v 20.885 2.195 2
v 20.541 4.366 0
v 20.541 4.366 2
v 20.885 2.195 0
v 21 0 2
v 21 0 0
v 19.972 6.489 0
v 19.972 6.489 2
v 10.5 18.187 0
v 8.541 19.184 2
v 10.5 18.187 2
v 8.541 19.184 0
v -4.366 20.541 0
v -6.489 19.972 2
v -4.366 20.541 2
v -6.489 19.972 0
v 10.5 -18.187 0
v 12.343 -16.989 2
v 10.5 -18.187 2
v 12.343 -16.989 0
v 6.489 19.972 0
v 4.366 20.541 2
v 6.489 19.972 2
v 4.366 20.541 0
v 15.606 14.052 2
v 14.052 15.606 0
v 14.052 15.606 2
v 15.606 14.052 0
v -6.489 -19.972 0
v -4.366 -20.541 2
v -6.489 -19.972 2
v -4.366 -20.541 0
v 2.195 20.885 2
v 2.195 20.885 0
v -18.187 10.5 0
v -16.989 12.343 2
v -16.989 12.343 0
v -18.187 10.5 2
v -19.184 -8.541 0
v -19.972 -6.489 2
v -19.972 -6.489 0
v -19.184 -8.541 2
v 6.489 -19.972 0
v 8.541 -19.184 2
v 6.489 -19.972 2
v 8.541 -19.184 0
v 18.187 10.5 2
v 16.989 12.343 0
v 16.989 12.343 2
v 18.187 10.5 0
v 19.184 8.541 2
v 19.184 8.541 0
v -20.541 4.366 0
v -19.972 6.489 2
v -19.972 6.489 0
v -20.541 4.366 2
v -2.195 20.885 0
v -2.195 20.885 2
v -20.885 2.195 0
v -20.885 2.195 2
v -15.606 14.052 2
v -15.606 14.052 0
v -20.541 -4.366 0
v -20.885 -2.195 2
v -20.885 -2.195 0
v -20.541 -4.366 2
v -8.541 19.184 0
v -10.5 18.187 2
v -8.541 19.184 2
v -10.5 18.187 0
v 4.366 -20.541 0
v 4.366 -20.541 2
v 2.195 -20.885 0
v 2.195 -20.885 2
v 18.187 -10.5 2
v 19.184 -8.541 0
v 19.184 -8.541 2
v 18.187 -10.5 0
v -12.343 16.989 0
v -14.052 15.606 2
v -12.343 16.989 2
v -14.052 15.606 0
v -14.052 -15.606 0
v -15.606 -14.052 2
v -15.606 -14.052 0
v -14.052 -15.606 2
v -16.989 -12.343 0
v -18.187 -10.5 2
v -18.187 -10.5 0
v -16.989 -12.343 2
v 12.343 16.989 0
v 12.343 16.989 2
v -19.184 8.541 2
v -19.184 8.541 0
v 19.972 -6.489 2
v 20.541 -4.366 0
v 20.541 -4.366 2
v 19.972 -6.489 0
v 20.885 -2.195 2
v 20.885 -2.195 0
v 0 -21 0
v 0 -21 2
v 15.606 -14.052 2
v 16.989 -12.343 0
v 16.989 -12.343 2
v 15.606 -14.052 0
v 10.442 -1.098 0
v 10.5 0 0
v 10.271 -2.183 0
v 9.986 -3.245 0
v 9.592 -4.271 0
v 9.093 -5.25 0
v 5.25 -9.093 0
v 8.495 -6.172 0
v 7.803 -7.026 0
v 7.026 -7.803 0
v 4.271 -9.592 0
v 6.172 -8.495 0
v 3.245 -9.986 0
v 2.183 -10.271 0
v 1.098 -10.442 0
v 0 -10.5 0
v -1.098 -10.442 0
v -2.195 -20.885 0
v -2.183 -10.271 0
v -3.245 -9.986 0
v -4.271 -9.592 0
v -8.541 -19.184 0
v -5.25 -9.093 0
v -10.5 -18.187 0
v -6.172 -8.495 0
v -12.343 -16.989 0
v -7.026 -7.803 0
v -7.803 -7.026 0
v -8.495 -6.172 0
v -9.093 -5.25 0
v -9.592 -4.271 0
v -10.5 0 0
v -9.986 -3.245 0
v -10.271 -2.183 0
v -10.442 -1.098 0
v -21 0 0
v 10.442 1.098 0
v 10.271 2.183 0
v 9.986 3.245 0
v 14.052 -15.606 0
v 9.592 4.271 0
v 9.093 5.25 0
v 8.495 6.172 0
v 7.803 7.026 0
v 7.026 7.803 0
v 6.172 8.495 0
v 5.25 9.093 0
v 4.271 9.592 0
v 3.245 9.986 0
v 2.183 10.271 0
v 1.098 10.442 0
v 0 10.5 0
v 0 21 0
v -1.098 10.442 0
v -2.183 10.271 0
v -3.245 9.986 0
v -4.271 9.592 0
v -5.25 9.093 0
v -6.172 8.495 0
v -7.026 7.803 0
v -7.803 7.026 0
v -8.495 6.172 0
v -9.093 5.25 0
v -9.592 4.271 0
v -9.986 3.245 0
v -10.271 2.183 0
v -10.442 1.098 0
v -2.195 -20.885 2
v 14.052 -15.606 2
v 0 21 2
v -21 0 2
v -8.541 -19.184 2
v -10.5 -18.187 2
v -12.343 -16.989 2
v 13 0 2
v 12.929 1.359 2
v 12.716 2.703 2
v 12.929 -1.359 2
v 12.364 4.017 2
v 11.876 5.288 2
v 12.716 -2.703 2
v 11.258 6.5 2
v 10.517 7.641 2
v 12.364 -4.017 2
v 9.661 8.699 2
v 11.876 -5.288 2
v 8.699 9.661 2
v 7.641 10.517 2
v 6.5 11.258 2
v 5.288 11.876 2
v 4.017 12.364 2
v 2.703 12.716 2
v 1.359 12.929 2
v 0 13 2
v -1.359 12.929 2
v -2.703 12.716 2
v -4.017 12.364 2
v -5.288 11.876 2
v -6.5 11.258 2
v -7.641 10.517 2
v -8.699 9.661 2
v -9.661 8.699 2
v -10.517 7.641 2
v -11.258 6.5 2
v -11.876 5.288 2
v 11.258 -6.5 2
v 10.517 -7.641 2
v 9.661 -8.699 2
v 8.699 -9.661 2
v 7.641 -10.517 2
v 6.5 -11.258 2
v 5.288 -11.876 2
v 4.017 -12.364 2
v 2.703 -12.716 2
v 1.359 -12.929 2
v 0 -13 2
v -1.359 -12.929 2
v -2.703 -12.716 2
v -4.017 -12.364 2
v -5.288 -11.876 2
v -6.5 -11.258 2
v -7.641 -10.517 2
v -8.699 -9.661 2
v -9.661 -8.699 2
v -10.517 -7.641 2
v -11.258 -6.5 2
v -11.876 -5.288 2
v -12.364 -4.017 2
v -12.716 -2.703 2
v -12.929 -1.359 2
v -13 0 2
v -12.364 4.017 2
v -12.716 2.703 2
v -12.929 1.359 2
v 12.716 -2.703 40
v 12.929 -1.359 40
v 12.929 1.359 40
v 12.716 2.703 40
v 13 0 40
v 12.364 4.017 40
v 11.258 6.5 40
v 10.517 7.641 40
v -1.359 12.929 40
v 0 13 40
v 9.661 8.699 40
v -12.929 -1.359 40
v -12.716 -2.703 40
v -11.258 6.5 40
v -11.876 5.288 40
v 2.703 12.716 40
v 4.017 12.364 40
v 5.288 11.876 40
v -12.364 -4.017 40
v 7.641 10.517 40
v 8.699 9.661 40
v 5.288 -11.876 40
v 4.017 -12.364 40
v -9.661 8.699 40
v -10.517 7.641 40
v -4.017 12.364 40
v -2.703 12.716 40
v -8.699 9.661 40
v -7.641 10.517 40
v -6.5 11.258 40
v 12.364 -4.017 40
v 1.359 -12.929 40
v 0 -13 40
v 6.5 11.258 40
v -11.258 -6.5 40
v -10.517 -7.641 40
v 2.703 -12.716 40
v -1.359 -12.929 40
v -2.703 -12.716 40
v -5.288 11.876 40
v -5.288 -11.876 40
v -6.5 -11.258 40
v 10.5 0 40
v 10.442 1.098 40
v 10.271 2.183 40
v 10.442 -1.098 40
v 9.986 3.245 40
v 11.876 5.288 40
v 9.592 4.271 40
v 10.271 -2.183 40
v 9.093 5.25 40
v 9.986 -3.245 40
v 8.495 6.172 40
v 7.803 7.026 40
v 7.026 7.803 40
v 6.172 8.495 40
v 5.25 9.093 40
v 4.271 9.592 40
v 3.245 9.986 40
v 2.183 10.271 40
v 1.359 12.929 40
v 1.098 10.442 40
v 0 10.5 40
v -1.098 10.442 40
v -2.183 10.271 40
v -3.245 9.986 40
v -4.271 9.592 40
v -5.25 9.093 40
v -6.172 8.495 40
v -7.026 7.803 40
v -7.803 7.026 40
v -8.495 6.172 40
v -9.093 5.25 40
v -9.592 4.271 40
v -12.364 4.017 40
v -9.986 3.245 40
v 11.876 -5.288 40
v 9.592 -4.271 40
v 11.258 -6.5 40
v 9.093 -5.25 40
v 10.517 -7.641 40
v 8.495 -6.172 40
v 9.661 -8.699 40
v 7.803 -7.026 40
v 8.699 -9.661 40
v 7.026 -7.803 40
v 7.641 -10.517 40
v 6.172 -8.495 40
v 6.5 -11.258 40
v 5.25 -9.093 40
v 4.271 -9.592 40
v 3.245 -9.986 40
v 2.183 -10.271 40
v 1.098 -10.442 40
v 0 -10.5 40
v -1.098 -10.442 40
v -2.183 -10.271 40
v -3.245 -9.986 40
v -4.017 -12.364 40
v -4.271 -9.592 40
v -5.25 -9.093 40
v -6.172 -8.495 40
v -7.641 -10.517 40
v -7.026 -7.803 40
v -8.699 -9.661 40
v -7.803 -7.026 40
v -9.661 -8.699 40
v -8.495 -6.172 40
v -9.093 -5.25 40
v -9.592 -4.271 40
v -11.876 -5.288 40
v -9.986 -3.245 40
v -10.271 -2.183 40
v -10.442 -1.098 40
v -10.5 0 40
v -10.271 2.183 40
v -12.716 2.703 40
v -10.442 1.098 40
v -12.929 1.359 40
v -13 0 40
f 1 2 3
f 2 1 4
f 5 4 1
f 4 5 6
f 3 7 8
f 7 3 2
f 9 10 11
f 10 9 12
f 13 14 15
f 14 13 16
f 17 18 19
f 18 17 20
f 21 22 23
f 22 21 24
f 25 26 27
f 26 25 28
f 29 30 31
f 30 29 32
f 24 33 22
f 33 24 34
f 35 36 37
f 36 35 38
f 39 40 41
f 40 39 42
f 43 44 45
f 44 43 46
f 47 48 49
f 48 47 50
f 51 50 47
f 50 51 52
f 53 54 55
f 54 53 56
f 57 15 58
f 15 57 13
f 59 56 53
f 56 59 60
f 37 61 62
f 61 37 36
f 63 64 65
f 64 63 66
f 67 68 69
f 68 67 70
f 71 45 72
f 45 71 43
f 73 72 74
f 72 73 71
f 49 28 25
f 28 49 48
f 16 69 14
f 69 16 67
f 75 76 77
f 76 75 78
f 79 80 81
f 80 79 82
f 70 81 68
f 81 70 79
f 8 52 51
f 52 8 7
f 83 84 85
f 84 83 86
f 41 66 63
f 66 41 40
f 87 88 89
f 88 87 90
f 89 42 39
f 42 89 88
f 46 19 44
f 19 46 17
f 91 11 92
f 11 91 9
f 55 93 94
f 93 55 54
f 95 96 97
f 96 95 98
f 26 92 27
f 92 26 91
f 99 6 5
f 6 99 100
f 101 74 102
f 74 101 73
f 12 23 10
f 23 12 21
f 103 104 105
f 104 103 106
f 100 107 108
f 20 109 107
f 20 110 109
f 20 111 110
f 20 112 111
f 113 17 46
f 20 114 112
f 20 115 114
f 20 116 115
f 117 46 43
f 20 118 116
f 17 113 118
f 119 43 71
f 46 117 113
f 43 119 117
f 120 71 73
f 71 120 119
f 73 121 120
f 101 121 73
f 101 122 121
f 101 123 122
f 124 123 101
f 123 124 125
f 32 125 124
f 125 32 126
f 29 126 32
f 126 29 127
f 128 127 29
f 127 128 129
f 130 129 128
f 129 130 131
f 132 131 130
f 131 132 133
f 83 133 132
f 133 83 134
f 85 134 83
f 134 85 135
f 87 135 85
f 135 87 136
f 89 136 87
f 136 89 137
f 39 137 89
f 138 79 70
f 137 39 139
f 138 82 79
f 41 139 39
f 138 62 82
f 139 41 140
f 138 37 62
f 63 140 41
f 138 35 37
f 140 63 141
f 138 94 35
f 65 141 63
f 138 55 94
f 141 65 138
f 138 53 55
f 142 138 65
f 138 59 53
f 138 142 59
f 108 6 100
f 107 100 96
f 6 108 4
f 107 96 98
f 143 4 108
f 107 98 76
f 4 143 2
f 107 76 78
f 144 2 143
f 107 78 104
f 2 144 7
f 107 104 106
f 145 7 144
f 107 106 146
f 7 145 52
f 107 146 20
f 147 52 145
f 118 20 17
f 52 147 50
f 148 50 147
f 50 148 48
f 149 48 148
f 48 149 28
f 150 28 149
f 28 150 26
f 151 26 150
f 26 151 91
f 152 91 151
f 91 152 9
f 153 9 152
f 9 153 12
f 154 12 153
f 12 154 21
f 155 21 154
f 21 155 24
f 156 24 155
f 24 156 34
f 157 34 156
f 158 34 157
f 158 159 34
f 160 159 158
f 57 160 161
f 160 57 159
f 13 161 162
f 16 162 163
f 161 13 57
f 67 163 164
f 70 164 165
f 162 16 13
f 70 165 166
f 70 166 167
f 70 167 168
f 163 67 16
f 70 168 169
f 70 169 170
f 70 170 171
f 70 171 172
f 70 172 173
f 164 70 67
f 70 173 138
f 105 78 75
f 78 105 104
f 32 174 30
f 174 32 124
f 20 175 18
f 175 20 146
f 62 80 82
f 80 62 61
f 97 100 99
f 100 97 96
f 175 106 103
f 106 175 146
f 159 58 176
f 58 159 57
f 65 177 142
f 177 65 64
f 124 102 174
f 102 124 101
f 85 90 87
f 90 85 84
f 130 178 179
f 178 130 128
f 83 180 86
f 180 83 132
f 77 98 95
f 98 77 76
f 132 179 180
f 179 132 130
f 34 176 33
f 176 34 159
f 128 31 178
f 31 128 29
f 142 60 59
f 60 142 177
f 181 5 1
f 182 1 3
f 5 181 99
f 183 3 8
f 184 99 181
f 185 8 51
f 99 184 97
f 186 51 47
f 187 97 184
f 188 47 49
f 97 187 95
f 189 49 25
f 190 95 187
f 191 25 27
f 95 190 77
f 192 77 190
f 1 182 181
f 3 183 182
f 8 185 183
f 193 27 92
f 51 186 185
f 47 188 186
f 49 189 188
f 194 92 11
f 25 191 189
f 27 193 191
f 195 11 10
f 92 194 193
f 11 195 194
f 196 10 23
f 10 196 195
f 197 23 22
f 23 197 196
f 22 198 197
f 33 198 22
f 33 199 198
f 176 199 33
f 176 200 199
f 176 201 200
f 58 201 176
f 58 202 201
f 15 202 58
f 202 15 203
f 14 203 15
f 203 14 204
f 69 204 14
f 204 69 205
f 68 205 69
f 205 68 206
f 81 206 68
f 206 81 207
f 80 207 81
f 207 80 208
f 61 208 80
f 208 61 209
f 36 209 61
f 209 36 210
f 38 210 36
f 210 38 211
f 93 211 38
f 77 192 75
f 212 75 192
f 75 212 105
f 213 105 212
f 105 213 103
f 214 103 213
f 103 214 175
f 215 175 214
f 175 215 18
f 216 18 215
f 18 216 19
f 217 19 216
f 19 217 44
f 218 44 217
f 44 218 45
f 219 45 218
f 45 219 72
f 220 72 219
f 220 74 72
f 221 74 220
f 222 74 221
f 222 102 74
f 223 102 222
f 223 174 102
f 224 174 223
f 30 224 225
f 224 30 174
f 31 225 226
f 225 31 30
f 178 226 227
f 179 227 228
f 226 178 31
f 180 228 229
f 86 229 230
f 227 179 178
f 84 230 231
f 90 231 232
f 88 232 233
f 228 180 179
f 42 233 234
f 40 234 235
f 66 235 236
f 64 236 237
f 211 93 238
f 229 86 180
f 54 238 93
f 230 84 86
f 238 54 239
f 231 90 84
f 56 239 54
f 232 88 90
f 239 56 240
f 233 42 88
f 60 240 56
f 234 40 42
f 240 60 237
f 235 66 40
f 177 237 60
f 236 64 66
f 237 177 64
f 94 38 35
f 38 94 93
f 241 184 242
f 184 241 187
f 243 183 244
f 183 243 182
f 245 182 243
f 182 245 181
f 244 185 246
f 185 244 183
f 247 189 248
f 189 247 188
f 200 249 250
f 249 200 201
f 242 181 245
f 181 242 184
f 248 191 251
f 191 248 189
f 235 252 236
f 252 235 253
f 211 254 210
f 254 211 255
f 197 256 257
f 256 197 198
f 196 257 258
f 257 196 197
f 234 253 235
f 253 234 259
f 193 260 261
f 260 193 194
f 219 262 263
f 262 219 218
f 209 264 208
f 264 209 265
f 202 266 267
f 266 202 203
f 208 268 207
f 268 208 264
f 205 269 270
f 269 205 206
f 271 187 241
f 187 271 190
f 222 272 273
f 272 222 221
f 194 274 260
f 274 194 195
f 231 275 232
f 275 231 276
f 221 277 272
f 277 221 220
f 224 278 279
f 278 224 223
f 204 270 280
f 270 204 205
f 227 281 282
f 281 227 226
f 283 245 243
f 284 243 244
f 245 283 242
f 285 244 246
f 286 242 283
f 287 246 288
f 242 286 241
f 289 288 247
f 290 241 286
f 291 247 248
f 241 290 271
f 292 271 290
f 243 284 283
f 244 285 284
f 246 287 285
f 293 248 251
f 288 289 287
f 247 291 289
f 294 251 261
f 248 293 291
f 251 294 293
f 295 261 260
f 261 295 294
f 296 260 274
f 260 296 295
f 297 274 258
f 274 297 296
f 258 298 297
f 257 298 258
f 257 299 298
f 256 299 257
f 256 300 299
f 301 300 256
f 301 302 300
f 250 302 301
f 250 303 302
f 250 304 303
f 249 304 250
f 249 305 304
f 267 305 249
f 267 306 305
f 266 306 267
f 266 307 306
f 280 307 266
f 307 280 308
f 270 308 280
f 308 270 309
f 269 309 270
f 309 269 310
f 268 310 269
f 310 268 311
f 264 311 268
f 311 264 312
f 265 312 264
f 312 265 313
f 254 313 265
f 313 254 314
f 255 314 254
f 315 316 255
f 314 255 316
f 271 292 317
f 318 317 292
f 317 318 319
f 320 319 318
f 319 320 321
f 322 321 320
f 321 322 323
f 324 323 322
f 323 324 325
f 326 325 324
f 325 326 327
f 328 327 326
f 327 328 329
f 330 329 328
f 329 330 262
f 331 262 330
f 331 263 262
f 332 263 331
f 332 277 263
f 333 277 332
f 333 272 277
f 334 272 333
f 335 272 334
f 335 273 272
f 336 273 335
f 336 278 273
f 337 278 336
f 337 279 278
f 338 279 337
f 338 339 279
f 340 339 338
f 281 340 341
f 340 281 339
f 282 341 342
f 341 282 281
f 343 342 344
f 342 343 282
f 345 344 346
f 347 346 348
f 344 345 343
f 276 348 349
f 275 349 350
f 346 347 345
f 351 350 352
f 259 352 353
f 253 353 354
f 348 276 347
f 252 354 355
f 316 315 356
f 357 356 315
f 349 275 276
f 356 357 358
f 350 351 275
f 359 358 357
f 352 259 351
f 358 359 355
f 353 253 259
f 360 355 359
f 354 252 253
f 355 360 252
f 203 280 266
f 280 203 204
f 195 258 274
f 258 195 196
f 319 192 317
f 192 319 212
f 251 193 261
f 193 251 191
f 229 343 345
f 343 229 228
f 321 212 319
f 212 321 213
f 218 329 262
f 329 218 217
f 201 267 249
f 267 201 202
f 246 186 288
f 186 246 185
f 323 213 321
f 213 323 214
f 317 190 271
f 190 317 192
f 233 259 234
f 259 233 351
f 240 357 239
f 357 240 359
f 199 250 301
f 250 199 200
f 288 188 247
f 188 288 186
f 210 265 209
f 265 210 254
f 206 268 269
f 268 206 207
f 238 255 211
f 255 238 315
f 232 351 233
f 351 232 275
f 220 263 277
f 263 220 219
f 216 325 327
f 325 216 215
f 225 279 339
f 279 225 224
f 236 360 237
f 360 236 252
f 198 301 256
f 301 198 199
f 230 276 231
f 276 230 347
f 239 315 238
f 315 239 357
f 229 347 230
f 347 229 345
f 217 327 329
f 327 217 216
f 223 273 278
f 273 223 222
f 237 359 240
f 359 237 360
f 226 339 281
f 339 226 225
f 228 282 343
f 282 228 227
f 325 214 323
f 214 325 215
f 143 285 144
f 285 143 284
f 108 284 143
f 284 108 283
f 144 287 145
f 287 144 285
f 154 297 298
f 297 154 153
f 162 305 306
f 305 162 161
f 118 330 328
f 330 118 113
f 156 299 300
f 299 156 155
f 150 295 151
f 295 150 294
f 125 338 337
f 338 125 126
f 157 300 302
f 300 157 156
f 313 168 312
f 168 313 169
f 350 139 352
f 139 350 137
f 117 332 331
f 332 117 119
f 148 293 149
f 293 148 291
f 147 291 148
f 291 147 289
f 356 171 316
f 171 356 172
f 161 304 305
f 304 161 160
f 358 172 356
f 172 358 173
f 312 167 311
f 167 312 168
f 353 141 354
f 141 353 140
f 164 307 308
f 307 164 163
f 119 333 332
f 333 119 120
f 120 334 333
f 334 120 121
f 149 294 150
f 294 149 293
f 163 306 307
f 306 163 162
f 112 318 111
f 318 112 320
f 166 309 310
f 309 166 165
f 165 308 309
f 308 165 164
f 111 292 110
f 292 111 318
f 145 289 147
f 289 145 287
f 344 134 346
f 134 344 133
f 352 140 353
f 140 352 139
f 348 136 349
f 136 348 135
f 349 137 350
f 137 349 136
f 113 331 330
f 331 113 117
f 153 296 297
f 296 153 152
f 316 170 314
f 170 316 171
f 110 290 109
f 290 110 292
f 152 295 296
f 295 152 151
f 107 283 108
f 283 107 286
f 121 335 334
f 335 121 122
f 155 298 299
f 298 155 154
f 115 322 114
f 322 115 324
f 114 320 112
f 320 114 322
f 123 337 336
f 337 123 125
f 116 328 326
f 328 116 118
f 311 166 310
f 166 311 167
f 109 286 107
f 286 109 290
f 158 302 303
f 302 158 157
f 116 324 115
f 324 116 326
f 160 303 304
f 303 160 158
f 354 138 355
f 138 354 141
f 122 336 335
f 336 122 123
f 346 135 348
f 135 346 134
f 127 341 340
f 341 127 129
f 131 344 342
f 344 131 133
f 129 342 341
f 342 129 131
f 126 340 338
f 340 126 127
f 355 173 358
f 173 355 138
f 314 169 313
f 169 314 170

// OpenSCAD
// Wall-mount standoff with screw flange.
$fn = 60;
eps = 0.02;
thread_d = 21;
base_d = 42;
length = 40;
difference() { union() { cylinder(d=base_d,h=2); cylinder(d=thread_d+5,h=length); } translate([0,0,-eps]) cylinder(d=thread_d,h=length+2*eps); }
